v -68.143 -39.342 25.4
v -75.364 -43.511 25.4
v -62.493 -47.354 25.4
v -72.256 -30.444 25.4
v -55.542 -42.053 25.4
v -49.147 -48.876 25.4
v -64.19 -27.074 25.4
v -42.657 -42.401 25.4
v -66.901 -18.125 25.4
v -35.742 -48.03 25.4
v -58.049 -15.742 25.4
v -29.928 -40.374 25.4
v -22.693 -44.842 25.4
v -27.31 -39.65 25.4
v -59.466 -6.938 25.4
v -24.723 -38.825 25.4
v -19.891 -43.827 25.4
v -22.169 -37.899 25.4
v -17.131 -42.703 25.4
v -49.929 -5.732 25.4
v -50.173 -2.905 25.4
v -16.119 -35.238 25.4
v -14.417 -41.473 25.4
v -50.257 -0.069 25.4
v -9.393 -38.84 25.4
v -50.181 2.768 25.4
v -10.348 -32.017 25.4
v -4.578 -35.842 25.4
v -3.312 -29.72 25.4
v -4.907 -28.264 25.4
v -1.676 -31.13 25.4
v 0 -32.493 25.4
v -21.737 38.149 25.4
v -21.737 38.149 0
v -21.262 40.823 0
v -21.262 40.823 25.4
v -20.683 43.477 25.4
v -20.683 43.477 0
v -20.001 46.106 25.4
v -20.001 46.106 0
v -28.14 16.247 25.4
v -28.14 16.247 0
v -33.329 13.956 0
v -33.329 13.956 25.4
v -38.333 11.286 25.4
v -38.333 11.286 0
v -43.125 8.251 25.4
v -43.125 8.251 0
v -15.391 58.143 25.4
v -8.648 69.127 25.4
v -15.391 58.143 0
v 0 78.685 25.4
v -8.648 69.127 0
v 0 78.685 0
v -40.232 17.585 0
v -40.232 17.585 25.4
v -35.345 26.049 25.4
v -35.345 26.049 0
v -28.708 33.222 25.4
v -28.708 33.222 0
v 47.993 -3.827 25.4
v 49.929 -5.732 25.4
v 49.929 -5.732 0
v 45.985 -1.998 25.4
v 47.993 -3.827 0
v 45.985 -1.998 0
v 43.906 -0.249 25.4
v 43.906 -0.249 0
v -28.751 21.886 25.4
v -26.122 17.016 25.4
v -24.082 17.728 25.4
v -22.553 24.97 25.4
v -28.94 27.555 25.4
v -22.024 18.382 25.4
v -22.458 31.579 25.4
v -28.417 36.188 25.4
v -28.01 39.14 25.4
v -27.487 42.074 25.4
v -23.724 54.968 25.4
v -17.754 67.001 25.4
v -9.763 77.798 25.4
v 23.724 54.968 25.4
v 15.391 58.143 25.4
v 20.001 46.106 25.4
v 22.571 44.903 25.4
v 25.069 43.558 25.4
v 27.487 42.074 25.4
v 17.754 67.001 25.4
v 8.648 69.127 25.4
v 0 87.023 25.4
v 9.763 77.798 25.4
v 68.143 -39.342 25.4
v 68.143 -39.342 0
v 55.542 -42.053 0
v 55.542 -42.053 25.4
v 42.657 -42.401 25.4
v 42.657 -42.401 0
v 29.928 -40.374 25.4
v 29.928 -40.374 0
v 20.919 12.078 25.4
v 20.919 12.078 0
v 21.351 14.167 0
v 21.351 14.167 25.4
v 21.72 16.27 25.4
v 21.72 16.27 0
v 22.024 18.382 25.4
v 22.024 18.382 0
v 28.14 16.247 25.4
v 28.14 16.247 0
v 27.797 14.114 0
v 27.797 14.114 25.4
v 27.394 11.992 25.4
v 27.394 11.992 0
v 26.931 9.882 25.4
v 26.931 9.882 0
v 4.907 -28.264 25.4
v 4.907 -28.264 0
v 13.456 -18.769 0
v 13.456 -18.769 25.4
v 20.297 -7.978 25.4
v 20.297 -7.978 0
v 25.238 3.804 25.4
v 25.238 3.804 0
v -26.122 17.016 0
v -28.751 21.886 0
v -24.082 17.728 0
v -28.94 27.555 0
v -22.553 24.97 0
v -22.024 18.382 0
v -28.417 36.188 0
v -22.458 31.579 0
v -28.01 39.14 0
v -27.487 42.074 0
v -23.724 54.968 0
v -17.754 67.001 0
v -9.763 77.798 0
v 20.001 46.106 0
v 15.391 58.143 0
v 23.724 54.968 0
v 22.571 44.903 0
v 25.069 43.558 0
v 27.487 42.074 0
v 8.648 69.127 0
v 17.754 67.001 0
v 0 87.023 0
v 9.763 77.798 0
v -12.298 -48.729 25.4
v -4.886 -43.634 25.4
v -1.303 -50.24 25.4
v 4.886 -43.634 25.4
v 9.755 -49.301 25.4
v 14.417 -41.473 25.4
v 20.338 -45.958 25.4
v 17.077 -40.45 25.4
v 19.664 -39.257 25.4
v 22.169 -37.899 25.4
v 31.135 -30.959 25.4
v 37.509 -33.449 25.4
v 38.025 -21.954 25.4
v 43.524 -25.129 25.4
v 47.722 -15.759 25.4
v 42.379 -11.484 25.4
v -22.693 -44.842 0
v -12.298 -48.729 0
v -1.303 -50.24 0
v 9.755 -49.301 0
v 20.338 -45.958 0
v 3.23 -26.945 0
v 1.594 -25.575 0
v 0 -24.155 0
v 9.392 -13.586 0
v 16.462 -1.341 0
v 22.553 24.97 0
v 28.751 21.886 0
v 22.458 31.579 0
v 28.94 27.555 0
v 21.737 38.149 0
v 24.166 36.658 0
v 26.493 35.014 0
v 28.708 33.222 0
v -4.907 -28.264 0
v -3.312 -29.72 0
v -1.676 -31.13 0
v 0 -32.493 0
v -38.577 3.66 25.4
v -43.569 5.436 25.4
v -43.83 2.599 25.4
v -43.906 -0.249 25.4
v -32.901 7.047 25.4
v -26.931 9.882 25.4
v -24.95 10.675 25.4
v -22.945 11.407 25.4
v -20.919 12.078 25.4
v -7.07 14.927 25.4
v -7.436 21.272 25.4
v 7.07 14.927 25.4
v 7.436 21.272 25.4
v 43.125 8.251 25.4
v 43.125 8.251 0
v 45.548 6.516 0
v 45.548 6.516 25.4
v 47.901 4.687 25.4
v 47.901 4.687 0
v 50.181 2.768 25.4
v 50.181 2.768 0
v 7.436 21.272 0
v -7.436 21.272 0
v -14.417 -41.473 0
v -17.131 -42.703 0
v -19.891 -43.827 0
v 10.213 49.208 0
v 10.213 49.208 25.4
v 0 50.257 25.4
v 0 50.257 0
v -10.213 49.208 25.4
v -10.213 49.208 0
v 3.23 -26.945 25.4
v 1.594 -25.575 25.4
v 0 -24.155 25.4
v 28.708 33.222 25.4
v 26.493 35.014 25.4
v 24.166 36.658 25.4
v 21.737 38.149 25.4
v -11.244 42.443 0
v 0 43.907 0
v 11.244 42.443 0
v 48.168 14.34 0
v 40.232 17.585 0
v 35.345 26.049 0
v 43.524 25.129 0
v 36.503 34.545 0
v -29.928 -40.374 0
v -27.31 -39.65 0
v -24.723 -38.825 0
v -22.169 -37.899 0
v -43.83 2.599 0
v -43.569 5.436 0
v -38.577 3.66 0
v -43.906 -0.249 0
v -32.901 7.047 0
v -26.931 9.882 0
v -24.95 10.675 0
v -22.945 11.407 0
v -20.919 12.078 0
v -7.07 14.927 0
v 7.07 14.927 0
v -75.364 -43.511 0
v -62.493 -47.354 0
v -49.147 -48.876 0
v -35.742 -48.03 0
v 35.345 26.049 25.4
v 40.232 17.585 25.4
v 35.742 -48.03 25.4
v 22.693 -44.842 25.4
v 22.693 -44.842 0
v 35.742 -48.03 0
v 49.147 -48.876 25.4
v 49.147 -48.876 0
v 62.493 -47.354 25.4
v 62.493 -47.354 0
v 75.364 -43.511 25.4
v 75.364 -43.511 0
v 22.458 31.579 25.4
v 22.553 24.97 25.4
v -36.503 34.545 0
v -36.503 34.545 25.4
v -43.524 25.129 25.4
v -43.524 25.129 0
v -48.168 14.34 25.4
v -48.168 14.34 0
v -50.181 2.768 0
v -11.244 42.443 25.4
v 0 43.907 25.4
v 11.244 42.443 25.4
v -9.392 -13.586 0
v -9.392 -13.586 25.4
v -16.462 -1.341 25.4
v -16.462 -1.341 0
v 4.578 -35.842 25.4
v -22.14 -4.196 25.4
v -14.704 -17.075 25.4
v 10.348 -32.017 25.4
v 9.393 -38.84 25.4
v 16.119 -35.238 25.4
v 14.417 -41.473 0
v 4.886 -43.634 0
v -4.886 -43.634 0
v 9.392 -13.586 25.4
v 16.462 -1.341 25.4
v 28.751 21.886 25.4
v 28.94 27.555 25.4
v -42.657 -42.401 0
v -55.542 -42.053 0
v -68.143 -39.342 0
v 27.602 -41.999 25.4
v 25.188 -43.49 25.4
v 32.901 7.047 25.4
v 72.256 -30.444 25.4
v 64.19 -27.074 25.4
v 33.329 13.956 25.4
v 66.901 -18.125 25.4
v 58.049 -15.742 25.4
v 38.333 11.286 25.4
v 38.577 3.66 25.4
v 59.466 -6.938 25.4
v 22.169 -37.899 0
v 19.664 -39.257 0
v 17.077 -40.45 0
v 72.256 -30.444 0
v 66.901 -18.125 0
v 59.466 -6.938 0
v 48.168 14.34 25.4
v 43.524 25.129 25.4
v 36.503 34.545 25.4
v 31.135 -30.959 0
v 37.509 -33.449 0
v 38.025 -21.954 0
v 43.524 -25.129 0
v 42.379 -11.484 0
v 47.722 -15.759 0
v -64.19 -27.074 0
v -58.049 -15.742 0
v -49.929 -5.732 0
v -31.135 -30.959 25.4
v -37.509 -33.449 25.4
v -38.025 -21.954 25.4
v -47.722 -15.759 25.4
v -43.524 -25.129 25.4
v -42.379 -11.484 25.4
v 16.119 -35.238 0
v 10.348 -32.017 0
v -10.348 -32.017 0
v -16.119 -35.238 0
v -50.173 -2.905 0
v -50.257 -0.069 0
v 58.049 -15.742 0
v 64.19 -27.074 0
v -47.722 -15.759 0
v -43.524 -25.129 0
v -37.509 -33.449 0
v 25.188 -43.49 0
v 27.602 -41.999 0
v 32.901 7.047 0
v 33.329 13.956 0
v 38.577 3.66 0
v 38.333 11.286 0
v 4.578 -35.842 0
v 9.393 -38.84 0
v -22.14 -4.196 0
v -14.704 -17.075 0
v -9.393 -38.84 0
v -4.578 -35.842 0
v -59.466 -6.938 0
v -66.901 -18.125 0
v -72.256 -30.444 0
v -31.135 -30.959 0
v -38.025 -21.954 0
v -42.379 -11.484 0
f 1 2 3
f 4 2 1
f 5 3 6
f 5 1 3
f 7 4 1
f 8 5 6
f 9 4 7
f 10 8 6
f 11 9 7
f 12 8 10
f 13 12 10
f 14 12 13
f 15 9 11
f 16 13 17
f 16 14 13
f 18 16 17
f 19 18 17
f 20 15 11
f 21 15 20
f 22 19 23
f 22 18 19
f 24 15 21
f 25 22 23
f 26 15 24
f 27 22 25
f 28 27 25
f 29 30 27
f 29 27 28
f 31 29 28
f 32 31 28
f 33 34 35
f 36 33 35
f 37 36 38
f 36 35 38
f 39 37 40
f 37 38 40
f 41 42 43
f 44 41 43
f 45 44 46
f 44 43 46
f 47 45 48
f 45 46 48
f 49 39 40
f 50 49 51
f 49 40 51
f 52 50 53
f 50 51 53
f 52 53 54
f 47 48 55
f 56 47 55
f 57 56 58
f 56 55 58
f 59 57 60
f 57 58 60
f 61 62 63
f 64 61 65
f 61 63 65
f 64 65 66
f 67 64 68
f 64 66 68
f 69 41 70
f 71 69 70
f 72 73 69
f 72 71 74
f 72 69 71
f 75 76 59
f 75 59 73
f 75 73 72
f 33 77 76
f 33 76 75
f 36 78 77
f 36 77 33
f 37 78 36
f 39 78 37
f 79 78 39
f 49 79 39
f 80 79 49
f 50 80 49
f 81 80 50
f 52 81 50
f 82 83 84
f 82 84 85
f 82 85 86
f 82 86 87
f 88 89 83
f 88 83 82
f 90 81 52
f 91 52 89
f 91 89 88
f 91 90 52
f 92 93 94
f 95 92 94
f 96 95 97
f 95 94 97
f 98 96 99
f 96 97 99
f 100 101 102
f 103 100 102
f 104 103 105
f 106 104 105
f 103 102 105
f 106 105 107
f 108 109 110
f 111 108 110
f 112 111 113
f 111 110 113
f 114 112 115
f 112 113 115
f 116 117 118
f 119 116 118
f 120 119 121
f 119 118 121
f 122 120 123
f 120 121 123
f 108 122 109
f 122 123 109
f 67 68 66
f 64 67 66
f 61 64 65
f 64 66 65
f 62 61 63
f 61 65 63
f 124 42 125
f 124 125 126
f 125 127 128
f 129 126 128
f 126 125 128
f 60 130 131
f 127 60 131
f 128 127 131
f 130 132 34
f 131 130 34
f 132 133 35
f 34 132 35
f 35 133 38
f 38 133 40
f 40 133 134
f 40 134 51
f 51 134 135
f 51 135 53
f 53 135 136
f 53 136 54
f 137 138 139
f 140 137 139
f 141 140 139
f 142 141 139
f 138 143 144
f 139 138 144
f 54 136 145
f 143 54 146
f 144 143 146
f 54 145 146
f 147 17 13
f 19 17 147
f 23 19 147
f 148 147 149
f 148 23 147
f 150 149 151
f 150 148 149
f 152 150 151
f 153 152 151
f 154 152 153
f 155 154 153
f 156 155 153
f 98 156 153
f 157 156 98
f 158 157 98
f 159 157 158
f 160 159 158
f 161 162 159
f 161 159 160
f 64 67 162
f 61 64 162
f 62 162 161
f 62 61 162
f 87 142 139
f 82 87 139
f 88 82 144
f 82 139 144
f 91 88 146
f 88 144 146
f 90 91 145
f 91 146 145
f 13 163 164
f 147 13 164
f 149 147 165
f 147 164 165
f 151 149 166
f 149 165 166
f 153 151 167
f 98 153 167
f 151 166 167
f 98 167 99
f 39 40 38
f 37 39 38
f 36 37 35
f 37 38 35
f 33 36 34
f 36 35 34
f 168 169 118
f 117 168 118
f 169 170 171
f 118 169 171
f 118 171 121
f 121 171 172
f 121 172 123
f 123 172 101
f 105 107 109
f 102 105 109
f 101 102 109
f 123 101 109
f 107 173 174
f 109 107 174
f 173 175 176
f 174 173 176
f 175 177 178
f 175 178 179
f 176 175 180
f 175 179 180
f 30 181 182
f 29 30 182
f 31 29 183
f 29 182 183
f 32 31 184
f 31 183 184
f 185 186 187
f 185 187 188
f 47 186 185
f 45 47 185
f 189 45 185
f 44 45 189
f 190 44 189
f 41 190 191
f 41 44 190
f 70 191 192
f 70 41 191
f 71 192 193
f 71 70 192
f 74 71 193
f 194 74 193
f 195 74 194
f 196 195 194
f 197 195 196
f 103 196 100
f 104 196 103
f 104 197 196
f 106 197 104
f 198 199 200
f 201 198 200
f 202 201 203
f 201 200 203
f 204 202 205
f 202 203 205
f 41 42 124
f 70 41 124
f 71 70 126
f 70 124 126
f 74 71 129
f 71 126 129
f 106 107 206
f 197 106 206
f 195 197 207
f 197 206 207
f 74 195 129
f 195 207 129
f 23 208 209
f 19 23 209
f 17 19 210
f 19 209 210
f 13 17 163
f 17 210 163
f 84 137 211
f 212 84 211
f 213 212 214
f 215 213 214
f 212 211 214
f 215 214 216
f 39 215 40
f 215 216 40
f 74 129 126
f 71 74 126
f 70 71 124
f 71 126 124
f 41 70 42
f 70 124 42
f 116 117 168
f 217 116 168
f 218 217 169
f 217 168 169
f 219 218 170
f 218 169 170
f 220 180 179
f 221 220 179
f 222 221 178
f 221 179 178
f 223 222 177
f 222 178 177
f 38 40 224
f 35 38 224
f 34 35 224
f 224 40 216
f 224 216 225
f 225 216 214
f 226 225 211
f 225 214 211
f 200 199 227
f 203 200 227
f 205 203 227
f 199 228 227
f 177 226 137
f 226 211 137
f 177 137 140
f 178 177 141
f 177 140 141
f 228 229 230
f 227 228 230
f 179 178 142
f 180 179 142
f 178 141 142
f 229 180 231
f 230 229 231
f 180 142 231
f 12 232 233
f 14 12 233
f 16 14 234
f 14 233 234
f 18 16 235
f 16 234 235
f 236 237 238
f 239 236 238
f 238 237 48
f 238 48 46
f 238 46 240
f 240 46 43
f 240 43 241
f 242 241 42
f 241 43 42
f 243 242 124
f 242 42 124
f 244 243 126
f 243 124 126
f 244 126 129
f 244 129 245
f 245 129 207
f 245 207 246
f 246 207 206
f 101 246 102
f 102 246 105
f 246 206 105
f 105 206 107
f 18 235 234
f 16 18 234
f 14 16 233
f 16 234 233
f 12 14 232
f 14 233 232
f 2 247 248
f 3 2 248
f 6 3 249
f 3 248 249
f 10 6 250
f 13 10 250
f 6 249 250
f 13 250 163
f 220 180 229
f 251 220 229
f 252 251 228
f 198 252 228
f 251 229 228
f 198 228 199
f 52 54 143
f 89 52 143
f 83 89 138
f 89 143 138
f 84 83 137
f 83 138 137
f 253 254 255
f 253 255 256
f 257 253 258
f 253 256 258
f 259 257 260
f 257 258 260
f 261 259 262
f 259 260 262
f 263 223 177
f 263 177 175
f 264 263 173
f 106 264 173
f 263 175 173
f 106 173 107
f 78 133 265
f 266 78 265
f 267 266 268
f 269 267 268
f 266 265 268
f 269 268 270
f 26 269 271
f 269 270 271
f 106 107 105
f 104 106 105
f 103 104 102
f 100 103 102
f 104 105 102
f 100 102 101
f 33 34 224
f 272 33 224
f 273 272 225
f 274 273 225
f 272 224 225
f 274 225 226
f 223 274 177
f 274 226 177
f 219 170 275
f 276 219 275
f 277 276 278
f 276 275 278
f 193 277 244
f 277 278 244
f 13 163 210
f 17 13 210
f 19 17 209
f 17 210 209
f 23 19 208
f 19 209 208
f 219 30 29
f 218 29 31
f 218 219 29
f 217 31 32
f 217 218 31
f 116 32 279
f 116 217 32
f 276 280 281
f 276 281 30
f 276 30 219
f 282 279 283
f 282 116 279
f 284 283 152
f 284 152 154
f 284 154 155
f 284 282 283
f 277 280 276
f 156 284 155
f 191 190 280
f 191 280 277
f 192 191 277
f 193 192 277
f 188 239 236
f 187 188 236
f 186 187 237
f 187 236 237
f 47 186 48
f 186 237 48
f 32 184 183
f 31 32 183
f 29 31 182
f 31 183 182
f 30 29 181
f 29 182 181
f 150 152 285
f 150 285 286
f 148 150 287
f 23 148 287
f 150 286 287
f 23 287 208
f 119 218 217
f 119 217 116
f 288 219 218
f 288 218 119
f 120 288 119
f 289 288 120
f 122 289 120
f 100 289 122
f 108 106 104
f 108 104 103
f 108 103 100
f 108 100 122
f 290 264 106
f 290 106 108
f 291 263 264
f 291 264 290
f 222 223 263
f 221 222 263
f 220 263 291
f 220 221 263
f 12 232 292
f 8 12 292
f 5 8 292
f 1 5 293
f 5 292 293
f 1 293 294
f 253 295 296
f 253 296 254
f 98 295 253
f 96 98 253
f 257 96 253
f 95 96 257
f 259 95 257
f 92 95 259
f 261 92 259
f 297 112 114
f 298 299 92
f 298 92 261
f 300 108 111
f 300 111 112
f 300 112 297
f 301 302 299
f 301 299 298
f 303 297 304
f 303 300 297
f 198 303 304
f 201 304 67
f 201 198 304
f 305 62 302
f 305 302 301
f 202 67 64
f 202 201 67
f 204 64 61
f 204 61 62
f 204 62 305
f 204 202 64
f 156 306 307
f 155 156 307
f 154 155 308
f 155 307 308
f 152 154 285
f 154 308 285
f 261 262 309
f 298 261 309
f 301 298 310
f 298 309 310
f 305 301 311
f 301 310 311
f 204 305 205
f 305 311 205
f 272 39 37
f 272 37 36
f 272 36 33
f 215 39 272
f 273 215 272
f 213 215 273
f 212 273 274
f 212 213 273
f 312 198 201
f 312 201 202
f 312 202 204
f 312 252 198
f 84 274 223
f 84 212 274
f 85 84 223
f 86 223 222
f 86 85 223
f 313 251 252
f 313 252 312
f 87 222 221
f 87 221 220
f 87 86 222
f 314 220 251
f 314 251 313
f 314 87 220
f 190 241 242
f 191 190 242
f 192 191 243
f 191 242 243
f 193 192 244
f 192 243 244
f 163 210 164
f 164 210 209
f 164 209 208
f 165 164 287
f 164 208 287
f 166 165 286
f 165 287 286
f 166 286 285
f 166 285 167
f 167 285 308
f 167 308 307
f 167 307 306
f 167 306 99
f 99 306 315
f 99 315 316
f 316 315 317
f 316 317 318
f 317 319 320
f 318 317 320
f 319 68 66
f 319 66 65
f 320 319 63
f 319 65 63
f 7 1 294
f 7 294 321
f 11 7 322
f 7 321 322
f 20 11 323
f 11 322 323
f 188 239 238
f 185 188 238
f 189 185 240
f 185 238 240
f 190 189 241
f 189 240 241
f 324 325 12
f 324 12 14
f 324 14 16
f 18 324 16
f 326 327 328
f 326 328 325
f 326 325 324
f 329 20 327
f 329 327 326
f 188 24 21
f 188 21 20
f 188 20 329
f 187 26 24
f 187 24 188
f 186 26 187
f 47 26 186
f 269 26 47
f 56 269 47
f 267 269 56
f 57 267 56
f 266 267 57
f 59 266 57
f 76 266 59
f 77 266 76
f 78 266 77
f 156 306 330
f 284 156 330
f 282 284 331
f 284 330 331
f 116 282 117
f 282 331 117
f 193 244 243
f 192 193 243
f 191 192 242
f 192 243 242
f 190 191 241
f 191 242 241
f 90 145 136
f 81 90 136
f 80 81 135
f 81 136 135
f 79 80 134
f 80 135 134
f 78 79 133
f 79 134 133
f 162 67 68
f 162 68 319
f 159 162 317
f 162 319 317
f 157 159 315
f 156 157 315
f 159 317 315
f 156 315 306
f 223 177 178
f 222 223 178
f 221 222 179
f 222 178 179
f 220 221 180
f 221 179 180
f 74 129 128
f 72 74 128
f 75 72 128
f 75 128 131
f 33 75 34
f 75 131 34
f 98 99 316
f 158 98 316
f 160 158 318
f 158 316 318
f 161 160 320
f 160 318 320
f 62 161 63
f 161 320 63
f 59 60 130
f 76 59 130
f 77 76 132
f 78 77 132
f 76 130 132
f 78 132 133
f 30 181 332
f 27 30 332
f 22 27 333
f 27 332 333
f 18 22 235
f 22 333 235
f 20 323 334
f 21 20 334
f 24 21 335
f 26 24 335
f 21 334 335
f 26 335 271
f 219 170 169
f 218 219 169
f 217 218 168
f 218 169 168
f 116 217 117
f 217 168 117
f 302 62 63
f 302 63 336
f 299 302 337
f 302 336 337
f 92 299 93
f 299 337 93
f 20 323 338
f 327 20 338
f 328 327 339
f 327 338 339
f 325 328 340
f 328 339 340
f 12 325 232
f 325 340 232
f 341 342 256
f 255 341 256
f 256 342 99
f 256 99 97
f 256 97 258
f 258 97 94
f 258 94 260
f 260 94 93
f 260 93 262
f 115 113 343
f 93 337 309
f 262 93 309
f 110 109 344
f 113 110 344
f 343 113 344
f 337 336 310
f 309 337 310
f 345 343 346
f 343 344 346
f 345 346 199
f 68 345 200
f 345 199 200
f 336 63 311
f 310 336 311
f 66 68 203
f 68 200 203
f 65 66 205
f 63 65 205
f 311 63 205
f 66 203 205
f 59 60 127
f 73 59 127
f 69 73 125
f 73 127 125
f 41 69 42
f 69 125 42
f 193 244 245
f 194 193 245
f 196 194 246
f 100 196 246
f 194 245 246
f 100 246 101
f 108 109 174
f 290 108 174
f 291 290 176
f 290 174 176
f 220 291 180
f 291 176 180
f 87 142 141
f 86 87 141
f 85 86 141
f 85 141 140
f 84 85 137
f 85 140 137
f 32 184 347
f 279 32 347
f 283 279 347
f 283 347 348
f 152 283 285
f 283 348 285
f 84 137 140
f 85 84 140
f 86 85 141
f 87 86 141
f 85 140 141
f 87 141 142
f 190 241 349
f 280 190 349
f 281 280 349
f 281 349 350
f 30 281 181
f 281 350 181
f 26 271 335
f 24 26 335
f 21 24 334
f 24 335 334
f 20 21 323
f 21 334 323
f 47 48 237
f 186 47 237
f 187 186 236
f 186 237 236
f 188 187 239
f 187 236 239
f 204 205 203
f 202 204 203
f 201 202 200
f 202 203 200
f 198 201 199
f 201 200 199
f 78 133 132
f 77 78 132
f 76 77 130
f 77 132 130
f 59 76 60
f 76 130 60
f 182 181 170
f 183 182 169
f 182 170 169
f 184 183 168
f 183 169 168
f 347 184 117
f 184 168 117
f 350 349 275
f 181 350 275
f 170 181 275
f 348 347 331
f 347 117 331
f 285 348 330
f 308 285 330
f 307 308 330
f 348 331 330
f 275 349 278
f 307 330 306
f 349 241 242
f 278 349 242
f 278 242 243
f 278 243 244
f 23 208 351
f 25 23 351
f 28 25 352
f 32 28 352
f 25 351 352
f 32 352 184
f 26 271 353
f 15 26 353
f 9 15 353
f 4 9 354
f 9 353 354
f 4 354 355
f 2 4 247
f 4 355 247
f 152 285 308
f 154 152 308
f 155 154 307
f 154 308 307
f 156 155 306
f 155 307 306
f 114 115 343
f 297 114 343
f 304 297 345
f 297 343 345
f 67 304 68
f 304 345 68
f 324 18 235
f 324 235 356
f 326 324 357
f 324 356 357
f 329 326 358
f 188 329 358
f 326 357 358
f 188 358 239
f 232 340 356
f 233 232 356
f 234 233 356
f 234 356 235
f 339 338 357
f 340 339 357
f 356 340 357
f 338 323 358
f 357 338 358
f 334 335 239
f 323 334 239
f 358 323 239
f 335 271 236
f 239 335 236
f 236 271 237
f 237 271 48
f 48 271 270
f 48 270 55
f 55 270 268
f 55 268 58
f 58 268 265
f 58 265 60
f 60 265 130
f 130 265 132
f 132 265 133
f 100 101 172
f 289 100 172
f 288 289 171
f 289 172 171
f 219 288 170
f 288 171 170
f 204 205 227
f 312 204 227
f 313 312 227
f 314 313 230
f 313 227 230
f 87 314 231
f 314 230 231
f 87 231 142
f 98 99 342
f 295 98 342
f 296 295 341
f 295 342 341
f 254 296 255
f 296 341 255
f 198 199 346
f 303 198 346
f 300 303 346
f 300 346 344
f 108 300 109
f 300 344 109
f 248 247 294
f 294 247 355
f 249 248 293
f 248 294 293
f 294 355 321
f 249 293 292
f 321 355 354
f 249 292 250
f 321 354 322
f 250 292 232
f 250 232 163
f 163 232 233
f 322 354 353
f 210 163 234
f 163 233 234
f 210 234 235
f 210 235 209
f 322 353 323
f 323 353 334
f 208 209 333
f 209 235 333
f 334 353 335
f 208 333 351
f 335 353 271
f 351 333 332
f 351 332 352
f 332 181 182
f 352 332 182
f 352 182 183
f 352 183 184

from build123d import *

# Parameters (mm, degrees)
F1_DEPTH = 25.4
F2_DEPTH = 25.4
F3_DEPTH = 25.4
F4_DEPTH = 25.4
F5_DEPTH = 25.4
F6_DEPTH = 25.4
F7_DEPTH = 25.4
F8_DEPTH = 25.4
F9_DEPTH = 25.4


with BuildPart() as f1:
    # F0 (on Top) → F1 (new body)
    with BuildSketch(Plane.XY):
        with BuildLine():
            ThreePointArc((0, 87.0226686738), (-17.7541746022, 67.0007496498), (-27.4874547758, 42.0738321855))
            ThreePointArc((-27.4874547758, 42.0738321855), (-28.2274989742, 37.6657729847), (-28.7076930336, 33.2218934859))
            ThreePointArc((-28.7076930336, 33.2218934859), (-28.8984315039, 24.7183376484), (-28.1398313513, 16.2465392056))
            ThreePointArc((-28.1398313513, 16.2465392056), (-25.1044220257, 17.3792312111), (-22.0235880171, 18.3818092703))
            ThreePointArc((-22.0235880171, 18.3818092703), (-22.5836977464, 28.2753433236), (-21.7374417892, 38.1485185894))
            ThreePointArc((-21.7374417892, 38.1485185894), (-20.9851816903, 42.1524893376), (-20.0006519478, 46.1057637014))
            ThreePointArc((-20.0006519478, 46.1057637014), (-12.2736801117, 63.7909795557), (0, 78.6849290011))
            ThreePointArc((0, 78.6849290011), (12.2736801117, 63.7909795557), (20.0006519478, 46.1057637014))
            ThreePointArc((20.0006519478, 46.1057637014), (23.829481488, 44.248427507), (27.4874547758, 42.0738321855))
            ThreePointArc((27.4874547758, 42.0738321855), (17.7541746022, 67.0007496498), (0, 87.0226686738))
        make_face()
    extrude(amount=F1_DEPTH)


with BuildPart() as f2:
    # F0 (on Top) → F2 (new body)
    with BuildSketch(Plane.XY):
        with BuildLine():
            ThreePointArc((-4.907319787, -28.2638913404), (-2.4986447142, -30.4306828271), (0, -32.4930784113))
            ThreePointArc((0, -32.4930784113), (6.9574925909, -37.3859446361), (14.4171572038, -41.4725381941))
            ThreePointArc((14.4171572038, -41.4725381941), (18.3800442243, -39.8748018229), (22.1688653205, -37.8994360974))
            ThreePointArc((22.1688653205, -37.8994360974), (13.1953167457, -33.6957276216), (4.907319787, -28.2638913404))
            ThreePointArc((4.907319787, -28.2638913404), (2.4065546981, -26.2658782251), (0, -24.1553387386))
            ThreePointArc((0, -24.1553387386), (-13.2375723861, -7.6427159771), (-20.9191369859, 12.0776693752))
            ThreePointArc((-20.9191369859, 12.0776693752), (-23.950195146, 11.0488016143), (-26.9309078055, 9.8820820761))
            ThreePointArc((-26.9309078055, 9.8820820761), (-18.7368337054, -10.81771598), (-4.907319787, -28.2638913404))
        make_face()
    extrude(amount=F2_DEPTH)


with BuildPart() as f3:
    # F0 (on Top) → F3 (new body)
    with BuildSketch(Plane.XY):
        with BuildLine():
            ThreePointArc((29.9284366524, -40.3739545298), (26.4055215546, -42.7611500811), (22.6932801193, -44.841750214))
            ThreePointArc((22.6932801193, -44.841750214), (49.1472639682, -48.8759410537), (75.3638417766, -43.5113343369))
            ThreePointArc((75.3638417766, -43.5113343369), (66.9014385705, -18.1248085961), (50.1807348951, 2.7679180285))
            ThreePointArc((50.1807348951, 2.7679180285), (46.733265745, 5.6128447047), (43.1248502374, 8.2506447082))
            ThreePointArc((43.1248502374, 8.2506447082), (35.8559240948, 12.6676069877), (28.1398313513, 16.2465392056))
            ThreePointArc((28.1398313513, 16.2465392056), (27.6030667405, 13.051451619), (26.9309078055, 9.8820820761))
            ThreePointArc((26.9309078055, 9.8820820761), (35.7790144928, 5.4203843047), (43.9063071097, -0.2490824843))
            ThreePointArc((43.9063071097, -0.2490824843), (46.9977174447, -2.9025442143), (49.9290886011, -5.731809164))
            ThreePointArc((49.9290886011, -5.731809164), (61.3814488873, -21.2661709979), (68.1431474157, -39.3424644987))
            ThreePointArc((68.1431474157, -39.3424644987), (49.1077687747, -42.5248085524), (29.9284366524, -40.3739545298))
        make_face()
    extrude(amount=F3_DEPTH)


with BuildPart() as f4:
    # F0 (on Top) → F4 (new body)
    with BuildSketch(Plane.XY):
        with BuildLine():
            ThreePointArc((-22.0235880171, 18.3818092703), (-25.1044220257, 17.3792312111), (-28.1398313513, 16.2465392056))
            ThreePointArc((-28.1398313513, 16.2465392056), (-35.8559240948, 12.6676069877), (-43.1248502374, 8.2506447082))
            ThreePointArc((-43.1248502374, 8.2506447082), (-43.7226134613, 4.0198156944), (-43.9063071097, -0.2490824843))
            ThreePointArc((-43.9063071097, -0.2490824843), (-35.7790144928, 5.4203843047), (-26.9309078055, 9.8820820761))
            ThreePointArc((-26.9309078055, 9.8820820761), (-23.950195146, 11.0488016143), (-20.9191369859, 12.0776693752))
            ThreePointArc((-20.9191369859, 12.0776693752), (0, 15.2854319654), (20.9191369859, 12.0776693752))
            ThreePointArc((20.9191369859, 12.0776693752), (21.5436404471, 15.2170766197), (22.0235880171, 18.3818092703))
            ThreePointArc((22.0235880171, 18.3818092703), (0, 21.6354319654), (-22.0235880171, 18.3818092703))
        make_face()
    extrude(amount=F4_DEPTH)


with BuildPart() as f5:
    # F0 (on Top) → F5 (new body)
    with BuildSketch(Plane.XY):
        with BuildLine():
            ThreePointArc((-50.1807348951, 2.7679180285), (-66.9014385705, -18.1248085961), (-75.3638417766, -43.5113343369))
            ThreePointArc((-75.3638417766, -43.5113343369), (-49.1472639682, -48.8759410537), (-22.6932801193, -44.841750214))
            ThreePointArc((-22.6932801193, -44.841750214), (-18.5057667708, -43.2786176893), (-14.4171572038, -41.4725381941))
            ThreePointArc((-14.4171572038, -41.4725381941), (-6.9574925909, -37.3859446361), (0, -32.4930784113))
            ThreePointArc((0, -32.4930784113), (-2.4986447142, -30.4306828271), (-4.907319787, -28.2638913404))
            ThreePointArc((-4.907319787, -28.2638913404), (-13.1953167457, -33.6957276216), (-22.1688653205, -37.8994360974))
            ThreePointArc((-22.1688653205, -37.8994360974), (-26.012535754, -39.2499451156), (-29.9284366524, -40.3739545298))
            ThreePointArc((-29.9284366524, -40.3739545298), (-49.1077687747, -42.5248085524), (-68.1431474157, -39.3424644987))
            ThreePointArc((-68.1431474157, -39.3424644987), (-61.3814488873, -21.2661709979), (-49.9290886011, -5.731809164))
            ThreePointArc((-49.9290886011, -5.731809164), (-50.2350030427, -1.487277422), (-50.1807348951, 2.7679180285))
        make_face()
    extrude(amount=F5_DEPTH)


with BuildPart() as f6:
    # F0 (on Top) → F6 (new body)
    with BuildSketch(Plane.XY):
        with BuildLine():
            ThreePointArc((0, -24.1553387386), (2.4065546981, -26.2658782251), (4.907319787, -28.2638913404))
            ThreePointArc((4.907319787, -28.2638913404), (18.7368337054, -10.81771598), (26.9309078055, 9.8820820761))
            ThreePointArc((26.9309078055, 9.8820820761), (27.6030667405, 13.051451619), (28.1398313513, 16.2465392056))
            ThreePointArc((28.1398313513, 16.2465392056), (28.8984315039, 24.7183376484), (28.7076930336, 33.2218934859))
            ThreePointArc((28.7076930336, 33.2218934859), (25.3425692373, 35.8549861323), (21.7374417892, 38.1485185894))
            ThreePointArc((21.7374417892, 38.1485185894), (22.5836977464, 28.2753433236), (22.0235880171, 18.3818092703))
            ThreePointArc((22.0235880171, 18.3818092703), (21.5436404471, 15.2170766197), (20.9191369859, 12.0776693752))
            ThreePointArc((20.9191369859, 12.0776693752), (13.2375723861, -7.6427159771), (0, -24.1553387386))
        make_face()
    extrude(amount=F6_DEPTH)


with BuildPart() as f7:
    # F0 (on Top) → F7 (new body)
    with BuildSketch(Plane.XY):
        with BuildLine():
            ThreePointArc((43.1248502374, 8.2506447082), (46.733265745, 5.6128447047), (50.1807348951, 2.7679180285))
            ThreePointArc((50.1807348951, 2.7679180285), (43.5238514337, 25.1285073414), (27.4874547758, 42.0738321855))
            ThreePointArc((27.4874547758, 42.0738321855), (23.829481488, 44.248427507), (20.0006519478, 46.1057637014))
            ThreePointArc((20.0006519478, 46.1057637014), (0, 50.2570146828), (-20.0006519478, 46.1057637014))
            ThreePointArc((-20.0006519478, 46.1057637014), (-20.9851816903, 42.1524893376), (-21.7374417892, 38.1485185894))
            ThreePointArc((-21.7374417892, 38.1485185894), (0, 43.9070136322), (21.7374417892, 38.1485185894))
            ThreePointArc((21.7374417892, 38.1485185894), (25.3425692373, 35.8549861323), (28.7076930336, 33.2218934859))
            ThreePointArc((28.7076930336, 33.2218934859), (38.0245892098, 21.9535068161), (43.1248502374, 8.2506447082))
        make_face()
    extrude(amount=F7_DEPTH)


with BuildPart() as f8:
    # F0 (on Top) → F8 (new body)
    with BuildSketch(Plane.XY):
        with BuildLine():
            ThreePointArc((-27.4874547758, 42.0738321855), (-43.5238514337, 25.1285073414), (-50.1807348951, 2.7679180285))
            ThreePointArc((-50.1807348951, 2.7679180285), (-50.2350030427, -1.487277422), (-49.9290886011, -5.731809164))
            ThreePointArc((-49.9290886011, -5.731809164), (-43.5238514356, -25.1285073381), (-29.9284366524, -40.3739545298))
            ThreePointArc((-29.9284366524, -40.3739545298), (-26.012535754, -39.2499451156), (-22.1688653205, -37.8994360974))
            ThreePointArc((-22.1688653205, -37.8994360974), (-38.0245892117, -21.9535068128), (-43.9063071097, -0.2490824843))
            ThreePointArc((-43.9063071097, -0.2490824843), (-43.7226134613, 4.0198156944), (-43.1248502374, 8.2506447082))
            ThreePointArc((-43.1248502374, 8.2506447082), (-38.0245892098, 21.9535068161), (-28.7076930336, 33.2218934859))
            ThreePointArc((-28.7076930336, 33.2218934859), (-28.2274989742, 37.6657729847), (-27.4874547758, 42.0738321855))
        make_face()
    extrude(amount=F8_DEPTH)


with BuildPart() as f9:
    # F0 (on Top) → F9 (new body)
    with BuildSketch(Plane.XY):
        with BuildLine():
            ThreePointArc((-14.4171572038, -41.4725381941), (-18.5057667708, -43.2786176893), (-22.6932801193, -44.841750214))
            ThreePointArc((-22.6932801193, -44.841750214), (0, -50.2570146828), (22.6932801193, -44.841750214))
            ThreePointArc((22.6932801193, -44.841750214), (26.4055215546, -42.7611500811), (29.9284366524, -40.3739545298))
            ThreePointArc((29.9284366524, -40.3739545298), (43.5238514356, -25.1285073381), (49.9290886011, -5.731809164))
            ThreePointArc((49.9290886011, -5.731809164), (46.9977174447, -2.9025442143), (43.9063071097, -0.2490824843))
            ThreePointArc((43.9063071097, -0.2490824843), (38.0245892117, -21.9535068128), (22.1688653205, -37.8994360974))
            ThreePointArc((22.1688653205, -37.8994360974), (18.3800442243, -39.8748018229), (14.4171572038, -41.4725381941))
            ThreePointArc((14.4171572038, -41.4725381941), (0, -43.9070136322), (-14.4171572038, -41.4725381941))
        make_face()
    extrude(amount=F9_DEPTH)


solid = Compound([f1.part, f2.part, f3.part, f4.part, f5.part, f6.part, f7.part, f8.part, f9.part])
